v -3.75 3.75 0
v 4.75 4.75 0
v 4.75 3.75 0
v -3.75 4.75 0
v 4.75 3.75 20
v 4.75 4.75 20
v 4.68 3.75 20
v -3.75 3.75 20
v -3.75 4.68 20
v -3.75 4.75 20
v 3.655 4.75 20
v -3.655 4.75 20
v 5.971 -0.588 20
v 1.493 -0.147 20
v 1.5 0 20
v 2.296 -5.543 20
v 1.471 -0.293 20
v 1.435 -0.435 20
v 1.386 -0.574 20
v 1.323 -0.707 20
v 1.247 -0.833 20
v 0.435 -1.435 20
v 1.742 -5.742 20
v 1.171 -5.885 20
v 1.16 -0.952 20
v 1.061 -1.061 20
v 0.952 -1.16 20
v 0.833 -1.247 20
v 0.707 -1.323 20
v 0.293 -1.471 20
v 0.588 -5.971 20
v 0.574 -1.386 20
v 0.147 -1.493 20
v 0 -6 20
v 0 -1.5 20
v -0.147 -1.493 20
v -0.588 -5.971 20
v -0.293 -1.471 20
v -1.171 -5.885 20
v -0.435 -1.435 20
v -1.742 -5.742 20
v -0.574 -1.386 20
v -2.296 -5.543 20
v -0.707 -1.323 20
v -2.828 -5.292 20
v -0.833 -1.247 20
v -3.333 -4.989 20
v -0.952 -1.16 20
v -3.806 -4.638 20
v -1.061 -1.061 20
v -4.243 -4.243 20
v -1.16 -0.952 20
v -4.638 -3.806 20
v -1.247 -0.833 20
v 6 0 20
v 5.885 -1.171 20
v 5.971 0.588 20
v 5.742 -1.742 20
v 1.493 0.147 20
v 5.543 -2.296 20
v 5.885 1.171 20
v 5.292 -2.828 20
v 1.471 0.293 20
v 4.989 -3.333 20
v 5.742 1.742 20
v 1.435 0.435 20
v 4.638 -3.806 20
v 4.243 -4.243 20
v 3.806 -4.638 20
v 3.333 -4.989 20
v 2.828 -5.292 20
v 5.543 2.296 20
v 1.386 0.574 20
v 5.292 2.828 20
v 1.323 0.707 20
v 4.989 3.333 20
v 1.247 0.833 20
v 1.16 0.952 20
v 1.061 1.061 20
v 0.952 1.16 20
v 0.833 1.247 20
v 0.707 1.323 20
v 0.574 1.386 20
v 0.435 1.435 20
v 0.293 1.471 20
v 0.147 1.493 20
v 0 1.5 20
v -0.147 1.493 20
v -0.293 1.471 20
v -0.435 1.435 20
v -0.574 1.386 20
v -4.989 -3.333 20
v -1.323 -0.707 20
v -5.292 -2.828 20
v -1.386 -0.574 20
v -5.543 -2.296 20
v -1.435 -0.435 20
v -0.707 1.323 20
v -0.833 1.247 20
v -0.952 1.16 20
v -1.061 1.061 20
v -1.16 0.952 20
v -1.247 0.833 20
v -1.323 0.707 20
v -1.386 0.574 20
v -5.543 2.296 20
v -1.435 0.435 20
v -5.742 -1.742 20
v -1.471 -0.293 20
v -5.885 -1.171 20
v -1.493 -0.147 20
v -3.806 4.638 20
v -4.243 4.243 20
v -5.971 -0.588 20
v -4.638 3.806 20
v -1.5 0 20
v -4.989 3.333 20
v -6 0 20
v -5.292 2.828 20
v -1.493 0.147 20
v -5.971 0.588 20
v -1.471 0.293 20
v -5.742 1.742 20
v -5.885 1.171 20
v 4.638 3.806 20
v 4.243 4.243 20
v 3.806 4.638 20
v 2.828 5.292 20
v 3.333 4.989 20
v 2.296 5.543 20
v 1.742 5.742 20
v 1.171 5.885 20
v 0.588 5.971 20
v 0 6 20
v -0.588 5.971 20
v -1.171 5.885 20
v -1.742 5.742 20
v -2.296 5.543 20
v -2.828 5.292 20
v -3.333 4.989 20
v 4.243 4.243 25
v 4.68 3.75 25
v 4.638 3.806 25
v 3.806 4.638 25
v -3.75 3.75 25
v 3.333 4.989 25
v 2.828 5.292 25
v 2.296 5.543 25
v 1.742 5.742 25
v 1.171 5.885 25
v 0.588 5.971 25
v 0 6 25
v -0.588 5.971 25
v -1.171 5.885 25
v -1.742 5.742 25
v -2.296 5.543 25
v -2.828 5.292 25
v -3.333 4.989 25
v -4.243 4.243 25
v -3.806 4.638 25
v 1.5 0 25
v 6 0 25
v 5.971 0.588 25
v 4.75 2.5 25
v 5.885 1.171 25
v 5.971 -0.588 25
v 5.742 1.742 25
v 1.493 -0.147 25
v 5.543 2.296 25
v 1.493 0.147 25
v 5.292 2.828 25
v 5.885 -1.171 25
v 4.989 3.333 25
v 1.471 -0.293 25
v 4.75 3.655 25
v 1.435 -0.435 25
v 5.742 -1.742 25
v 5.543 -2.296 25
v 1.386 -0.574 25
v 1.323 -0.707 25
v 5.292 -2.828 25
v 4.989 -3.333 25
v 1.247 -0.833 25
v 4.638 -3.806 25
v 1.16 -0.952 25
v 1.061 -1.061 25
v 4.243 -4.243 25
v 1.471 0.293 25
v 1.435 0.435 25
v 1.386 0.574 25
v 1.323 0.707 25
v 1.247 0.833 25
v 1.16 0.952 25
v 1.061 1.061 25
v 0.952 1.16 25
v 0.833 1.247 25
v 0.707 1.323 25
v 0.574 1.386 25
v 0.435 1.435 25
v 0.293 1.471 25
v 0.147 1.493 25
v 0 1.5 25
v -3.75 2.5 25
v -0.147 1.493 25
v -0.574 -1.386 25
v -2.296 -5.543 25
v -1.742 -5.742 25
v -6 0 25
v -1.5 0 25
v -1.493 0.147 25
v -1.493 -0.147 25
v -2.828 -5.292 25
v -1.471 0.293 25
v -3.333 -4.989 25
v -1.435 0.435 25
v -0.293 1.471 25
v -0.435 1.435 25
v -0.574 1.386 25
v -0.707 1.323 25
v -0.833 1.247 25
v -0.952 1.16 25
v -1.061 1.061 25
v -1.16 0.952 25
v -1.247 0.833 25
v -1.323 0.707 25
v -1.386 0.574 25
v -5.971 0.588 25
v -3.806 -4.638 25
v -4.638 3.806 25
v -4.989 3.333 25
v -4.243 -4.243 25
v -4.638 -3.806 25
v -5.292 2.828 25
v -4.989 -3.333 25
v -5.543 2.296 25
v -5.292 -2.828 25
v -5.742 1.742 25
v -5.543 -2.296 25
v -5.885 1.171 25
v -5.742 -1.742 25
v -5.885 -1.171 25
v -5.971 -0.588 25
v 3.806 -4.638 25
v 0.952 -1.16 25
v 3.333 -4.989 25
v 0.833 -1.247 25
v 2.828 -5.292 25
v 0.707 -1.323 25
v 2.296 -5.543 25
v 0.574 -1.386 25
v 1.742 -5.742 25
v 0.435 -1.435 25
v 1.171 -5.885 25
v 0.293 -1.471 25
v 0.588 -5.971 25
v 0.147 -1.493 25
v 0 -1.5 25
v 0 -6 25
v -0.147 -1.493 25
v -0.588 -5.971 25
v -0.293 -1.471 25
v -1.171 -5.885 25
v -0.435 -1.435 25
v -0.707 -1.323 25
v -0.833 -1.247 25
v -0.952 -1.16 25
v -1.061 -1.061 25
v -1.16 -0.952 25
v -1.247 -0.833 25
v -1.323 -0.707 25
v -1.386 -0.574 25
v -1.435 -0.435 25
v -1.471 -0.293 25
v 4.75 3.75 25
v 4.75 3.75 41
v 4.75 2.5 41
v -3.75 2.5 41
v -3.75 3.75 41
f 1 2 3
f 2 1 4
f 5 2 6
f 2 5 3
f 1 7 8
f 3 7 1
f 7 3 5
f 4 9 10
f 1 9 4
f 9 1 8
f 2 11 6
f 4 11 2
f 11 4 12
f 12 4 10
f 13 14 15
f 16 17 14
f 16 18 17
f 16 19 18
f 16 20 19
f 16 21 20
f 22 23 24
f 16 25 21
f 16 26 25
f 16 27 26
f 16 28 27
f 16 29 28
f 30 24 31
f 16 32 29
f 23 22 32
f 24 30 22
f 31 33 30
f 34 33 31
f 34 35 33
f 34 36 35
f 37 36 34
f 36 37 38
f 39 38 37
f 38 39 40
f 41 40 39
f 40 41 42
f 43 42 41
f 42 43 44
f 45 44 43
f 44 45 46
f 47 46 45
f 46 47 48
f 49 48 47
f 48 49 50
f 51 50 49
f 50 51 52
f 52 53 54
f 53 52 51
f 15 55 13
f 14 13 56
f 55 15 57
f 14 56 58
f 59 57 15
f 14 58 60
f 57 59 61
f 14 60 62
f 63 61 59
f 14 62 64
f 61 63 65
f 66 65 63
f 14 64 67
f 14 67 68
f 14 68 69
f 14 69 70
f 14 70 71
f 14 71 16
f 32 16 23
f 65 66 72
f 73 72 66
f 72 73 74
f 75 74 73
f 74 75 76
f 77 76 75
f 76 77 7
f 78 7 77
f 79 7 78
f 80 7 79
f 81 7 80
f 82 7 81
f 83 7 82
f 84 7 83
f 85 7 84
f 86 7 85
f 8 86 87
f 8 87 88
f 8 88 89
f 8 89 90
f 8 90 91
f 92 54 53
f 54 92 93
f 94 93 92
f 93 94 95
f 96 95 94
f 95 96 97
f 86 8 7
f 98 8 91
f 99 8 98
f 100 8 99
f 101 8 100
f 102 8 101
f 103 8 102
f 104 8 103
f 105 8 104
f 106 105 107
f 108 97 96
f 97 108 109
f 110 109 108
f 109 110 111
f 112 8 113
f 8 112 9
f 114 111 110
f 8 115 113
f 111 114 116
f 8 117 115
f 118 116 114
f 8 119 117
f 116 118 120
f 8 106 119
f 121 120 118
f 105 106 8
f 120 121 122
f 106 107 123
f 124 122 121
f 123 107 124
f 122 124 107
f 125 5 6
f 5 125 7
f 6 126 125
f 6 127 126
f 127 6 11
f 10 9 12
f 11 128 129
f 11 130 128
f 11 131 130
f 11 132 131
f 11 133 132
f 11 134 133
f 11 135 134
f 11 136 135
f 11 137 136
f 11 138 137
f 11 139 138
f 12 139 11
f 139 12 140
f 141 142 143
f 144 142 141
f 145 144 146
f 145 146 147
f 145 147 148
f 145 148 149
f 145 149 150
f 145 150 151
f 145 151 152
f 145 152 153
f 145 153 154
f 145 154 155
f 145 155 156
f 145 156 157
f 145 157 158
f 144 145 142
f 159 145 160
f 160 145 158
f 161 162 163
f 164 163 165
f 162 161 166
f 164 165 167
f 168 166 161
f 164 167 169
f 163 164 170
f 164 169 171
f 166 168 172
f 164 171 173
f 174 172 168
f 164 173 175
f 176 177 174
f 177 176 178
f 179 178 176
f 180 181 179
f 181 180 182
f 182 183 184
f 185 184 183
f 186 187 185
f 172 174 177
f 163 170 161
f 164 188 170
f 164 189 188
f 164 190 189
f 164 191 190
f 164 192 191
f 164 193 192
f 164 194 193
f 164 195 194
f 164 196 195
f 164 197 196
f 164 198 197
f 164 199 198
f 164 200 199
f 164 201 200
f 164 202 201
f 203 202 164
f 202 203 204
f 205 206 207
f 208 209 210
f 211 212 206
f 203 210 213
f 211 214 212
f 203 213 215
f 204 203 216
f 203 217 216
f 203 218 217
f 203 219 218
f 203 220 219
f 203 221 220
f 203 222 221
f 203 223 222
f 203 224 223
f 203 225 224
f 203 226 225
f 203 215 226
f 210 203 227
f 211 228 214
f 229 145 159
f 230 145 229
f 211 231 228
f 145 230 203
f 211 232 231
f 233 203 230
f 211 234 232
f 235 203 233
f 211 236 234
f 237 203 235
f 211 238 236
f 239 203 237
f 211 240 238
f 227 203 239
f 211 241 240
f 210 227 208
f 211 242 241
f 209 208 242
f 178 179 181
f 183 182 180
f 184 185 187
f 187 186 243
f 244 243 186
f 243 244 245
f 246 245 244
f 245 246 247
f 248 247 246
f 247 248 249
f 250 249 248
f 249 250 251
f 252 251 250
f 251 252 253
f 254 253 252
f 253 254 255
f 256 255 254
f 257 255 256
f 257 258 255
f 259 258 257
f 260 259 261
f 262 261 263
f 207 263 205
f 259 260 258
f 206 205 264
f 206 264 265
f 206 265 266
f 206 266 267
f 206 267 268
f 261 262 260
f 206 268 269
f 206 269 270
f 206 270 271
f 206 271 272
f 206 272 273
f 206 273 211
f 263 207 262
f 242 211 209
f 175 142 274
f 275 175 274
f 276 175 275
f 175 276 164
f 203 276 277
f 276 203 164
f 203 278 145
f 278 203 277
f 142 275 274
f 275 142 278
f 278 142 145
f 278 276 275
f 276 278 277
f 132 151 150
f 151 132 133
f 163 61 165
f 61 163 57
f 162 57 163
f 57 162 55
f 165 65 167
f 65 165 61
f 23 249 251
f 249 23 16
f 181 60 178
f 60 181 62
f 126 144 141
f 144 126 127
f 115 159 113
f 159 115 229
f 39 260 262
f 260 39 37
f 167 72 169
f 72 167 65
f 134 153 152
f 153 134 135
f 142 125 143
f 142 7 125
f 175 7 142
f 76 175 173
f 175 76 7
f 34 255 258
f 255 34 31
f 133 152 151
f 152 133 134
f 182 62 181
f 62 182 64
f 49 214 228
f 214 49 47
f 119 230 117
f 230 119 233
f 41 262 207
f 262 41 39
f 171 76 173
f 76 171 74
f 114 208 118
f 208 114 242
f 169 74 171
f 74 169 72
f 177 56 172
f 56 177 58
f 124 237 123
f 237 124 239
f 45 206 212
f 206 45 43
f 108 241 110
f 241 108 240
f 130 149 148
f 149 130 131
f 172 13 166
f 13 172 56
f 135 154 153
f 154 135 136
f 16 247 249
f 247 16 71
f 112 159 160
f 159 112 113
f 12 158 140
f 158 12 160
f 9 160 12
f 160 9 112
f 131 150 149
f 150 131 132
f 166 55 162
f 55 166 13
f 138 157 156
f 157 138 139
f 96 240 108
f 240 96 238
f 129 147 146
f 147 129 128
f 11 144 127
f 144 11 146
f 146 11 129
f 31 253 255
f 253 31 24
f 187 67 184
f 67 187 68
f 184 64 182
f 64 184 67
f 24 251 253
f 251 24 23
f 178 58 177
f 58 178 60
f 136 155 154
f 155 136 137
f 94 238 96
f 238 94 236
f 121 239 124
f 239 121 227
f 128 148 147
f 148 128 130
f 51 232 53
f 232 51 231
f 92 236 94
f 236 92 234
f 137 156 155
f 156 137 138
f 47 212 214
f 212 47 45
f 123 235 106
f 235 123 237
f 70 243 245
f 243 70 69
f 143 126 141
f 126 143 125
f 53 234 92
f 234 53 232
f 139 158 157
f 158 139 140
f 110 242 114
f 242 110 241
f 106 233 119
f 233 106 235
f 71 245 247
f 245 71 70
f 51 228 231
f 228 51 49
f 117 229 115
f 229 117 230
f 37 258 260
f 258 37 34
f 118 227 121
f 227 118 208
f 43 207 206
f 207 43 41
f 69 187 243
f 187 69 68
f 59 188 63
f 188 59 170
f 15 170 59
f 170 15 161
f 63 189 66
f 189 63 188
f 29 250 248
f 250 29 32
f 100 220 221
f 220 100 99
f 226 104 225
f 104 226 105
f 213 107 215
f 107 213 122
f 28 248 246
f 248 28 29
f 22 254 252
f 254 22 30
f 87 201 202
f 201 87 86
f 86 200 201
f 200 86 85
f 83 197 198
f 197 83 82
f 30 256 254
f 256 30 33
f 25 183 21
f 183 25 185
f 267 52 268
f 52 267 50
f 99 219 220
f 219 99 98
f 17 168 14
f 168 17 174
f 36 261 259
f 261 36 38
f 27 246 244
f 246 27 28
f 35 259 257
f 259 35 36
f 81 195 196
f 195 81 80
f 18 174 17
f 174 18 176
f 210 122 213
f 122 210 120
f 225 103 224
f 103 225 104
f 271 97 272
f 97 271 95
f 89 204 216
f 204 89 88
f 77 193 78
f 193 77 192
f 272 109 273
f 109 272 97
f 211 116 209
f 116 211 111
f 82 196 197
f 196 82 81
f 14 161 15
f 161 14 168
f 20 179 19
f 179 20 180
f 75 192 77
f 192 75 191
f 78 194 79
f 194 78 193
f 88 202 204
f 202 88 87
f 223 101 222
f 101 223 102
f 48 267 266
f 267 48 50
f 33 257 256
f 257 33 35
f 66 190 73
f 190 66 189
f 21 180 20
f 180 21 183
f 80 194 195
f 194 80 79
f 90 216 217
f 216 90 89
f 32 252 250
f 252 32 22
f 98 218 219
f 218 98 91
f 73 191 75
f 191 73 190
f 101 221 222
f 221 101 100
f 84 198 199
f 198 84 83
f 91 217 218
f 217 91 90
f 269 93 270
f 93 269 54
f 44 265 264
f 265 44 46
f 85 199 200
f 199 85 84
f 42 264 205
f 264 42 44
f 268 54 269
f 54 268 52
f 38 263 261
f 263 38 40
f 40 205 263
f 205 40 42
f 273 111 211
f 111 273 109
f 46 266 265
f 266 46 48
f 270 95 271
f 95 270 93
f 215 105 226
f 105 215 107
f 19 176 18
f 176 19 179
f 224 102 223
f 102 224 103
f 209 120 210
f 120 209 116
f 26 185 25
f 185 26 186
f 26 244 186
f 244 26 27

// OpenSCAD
// Hose-barb reducer: 8 mm ID -> 5 mm ID
// Print orientation: standing upright along +Z

$fn = 64;

// ---- Dimensions (mm) ----
id_8     = 8;    // inner diameter of 8 mm tubing
id_5     = 5;    // inner diameter of 5 mm tubing
bore     = 3;    // through-bore diameter
base_d   = 7.5;  // barb outer diameter at bottom
top_d    = 9.5;  // barb outer diameter at top (8 mm side)
collar_d = 12;   // collar outer diameter
collar_h = 5;    // collar height
len_8    = 20;   // height of 8 mm tubing section
len_5    = 16;   // height of 5 mm tubing section (z = 25 to z = 41)

eps = 0.5;       // cutter overshoot

// ---- Model ----
difference() {
    union() {
        // 8 mm tubing: two stacked barbs, sawtooth profile
        for (z = [0, len_8/2])
            translate([0, 0, z])
                linear_extrude(height = len_8/2)
                    polygon([
                        [-base_d/2, base_d/2],
                        [ top_d/2, base_d/2],
                        [ top_d/2, top_d/2],
                        [-base_d/2, top_d/2]
                    ]);

        // Collar
        translate([0, 0, len_8])
            cylinder(d = collar_d, h = collar_h);

        // 5 mm tubing: two stacked barbs, shrinking profile
        for (z = [len_8 + collar_h, len_8 + collar_h + len_5/2])
            translate([0, 0, z])
                linear_extrude(height = len_5/2)
                    polygon([
                        [-base_d/2, base_d/2],
                        [ top_d/2, base_d/2],
                        [ top_d/2, id_5/2],
                        [-base_d/2, id_5/2]
                    ]);
    }

    // Through-bore
    translate([0, 0, -eps])
        cylinder(d = bore, h = len_8 + collar_h + len_5 + 2*eps);
}
